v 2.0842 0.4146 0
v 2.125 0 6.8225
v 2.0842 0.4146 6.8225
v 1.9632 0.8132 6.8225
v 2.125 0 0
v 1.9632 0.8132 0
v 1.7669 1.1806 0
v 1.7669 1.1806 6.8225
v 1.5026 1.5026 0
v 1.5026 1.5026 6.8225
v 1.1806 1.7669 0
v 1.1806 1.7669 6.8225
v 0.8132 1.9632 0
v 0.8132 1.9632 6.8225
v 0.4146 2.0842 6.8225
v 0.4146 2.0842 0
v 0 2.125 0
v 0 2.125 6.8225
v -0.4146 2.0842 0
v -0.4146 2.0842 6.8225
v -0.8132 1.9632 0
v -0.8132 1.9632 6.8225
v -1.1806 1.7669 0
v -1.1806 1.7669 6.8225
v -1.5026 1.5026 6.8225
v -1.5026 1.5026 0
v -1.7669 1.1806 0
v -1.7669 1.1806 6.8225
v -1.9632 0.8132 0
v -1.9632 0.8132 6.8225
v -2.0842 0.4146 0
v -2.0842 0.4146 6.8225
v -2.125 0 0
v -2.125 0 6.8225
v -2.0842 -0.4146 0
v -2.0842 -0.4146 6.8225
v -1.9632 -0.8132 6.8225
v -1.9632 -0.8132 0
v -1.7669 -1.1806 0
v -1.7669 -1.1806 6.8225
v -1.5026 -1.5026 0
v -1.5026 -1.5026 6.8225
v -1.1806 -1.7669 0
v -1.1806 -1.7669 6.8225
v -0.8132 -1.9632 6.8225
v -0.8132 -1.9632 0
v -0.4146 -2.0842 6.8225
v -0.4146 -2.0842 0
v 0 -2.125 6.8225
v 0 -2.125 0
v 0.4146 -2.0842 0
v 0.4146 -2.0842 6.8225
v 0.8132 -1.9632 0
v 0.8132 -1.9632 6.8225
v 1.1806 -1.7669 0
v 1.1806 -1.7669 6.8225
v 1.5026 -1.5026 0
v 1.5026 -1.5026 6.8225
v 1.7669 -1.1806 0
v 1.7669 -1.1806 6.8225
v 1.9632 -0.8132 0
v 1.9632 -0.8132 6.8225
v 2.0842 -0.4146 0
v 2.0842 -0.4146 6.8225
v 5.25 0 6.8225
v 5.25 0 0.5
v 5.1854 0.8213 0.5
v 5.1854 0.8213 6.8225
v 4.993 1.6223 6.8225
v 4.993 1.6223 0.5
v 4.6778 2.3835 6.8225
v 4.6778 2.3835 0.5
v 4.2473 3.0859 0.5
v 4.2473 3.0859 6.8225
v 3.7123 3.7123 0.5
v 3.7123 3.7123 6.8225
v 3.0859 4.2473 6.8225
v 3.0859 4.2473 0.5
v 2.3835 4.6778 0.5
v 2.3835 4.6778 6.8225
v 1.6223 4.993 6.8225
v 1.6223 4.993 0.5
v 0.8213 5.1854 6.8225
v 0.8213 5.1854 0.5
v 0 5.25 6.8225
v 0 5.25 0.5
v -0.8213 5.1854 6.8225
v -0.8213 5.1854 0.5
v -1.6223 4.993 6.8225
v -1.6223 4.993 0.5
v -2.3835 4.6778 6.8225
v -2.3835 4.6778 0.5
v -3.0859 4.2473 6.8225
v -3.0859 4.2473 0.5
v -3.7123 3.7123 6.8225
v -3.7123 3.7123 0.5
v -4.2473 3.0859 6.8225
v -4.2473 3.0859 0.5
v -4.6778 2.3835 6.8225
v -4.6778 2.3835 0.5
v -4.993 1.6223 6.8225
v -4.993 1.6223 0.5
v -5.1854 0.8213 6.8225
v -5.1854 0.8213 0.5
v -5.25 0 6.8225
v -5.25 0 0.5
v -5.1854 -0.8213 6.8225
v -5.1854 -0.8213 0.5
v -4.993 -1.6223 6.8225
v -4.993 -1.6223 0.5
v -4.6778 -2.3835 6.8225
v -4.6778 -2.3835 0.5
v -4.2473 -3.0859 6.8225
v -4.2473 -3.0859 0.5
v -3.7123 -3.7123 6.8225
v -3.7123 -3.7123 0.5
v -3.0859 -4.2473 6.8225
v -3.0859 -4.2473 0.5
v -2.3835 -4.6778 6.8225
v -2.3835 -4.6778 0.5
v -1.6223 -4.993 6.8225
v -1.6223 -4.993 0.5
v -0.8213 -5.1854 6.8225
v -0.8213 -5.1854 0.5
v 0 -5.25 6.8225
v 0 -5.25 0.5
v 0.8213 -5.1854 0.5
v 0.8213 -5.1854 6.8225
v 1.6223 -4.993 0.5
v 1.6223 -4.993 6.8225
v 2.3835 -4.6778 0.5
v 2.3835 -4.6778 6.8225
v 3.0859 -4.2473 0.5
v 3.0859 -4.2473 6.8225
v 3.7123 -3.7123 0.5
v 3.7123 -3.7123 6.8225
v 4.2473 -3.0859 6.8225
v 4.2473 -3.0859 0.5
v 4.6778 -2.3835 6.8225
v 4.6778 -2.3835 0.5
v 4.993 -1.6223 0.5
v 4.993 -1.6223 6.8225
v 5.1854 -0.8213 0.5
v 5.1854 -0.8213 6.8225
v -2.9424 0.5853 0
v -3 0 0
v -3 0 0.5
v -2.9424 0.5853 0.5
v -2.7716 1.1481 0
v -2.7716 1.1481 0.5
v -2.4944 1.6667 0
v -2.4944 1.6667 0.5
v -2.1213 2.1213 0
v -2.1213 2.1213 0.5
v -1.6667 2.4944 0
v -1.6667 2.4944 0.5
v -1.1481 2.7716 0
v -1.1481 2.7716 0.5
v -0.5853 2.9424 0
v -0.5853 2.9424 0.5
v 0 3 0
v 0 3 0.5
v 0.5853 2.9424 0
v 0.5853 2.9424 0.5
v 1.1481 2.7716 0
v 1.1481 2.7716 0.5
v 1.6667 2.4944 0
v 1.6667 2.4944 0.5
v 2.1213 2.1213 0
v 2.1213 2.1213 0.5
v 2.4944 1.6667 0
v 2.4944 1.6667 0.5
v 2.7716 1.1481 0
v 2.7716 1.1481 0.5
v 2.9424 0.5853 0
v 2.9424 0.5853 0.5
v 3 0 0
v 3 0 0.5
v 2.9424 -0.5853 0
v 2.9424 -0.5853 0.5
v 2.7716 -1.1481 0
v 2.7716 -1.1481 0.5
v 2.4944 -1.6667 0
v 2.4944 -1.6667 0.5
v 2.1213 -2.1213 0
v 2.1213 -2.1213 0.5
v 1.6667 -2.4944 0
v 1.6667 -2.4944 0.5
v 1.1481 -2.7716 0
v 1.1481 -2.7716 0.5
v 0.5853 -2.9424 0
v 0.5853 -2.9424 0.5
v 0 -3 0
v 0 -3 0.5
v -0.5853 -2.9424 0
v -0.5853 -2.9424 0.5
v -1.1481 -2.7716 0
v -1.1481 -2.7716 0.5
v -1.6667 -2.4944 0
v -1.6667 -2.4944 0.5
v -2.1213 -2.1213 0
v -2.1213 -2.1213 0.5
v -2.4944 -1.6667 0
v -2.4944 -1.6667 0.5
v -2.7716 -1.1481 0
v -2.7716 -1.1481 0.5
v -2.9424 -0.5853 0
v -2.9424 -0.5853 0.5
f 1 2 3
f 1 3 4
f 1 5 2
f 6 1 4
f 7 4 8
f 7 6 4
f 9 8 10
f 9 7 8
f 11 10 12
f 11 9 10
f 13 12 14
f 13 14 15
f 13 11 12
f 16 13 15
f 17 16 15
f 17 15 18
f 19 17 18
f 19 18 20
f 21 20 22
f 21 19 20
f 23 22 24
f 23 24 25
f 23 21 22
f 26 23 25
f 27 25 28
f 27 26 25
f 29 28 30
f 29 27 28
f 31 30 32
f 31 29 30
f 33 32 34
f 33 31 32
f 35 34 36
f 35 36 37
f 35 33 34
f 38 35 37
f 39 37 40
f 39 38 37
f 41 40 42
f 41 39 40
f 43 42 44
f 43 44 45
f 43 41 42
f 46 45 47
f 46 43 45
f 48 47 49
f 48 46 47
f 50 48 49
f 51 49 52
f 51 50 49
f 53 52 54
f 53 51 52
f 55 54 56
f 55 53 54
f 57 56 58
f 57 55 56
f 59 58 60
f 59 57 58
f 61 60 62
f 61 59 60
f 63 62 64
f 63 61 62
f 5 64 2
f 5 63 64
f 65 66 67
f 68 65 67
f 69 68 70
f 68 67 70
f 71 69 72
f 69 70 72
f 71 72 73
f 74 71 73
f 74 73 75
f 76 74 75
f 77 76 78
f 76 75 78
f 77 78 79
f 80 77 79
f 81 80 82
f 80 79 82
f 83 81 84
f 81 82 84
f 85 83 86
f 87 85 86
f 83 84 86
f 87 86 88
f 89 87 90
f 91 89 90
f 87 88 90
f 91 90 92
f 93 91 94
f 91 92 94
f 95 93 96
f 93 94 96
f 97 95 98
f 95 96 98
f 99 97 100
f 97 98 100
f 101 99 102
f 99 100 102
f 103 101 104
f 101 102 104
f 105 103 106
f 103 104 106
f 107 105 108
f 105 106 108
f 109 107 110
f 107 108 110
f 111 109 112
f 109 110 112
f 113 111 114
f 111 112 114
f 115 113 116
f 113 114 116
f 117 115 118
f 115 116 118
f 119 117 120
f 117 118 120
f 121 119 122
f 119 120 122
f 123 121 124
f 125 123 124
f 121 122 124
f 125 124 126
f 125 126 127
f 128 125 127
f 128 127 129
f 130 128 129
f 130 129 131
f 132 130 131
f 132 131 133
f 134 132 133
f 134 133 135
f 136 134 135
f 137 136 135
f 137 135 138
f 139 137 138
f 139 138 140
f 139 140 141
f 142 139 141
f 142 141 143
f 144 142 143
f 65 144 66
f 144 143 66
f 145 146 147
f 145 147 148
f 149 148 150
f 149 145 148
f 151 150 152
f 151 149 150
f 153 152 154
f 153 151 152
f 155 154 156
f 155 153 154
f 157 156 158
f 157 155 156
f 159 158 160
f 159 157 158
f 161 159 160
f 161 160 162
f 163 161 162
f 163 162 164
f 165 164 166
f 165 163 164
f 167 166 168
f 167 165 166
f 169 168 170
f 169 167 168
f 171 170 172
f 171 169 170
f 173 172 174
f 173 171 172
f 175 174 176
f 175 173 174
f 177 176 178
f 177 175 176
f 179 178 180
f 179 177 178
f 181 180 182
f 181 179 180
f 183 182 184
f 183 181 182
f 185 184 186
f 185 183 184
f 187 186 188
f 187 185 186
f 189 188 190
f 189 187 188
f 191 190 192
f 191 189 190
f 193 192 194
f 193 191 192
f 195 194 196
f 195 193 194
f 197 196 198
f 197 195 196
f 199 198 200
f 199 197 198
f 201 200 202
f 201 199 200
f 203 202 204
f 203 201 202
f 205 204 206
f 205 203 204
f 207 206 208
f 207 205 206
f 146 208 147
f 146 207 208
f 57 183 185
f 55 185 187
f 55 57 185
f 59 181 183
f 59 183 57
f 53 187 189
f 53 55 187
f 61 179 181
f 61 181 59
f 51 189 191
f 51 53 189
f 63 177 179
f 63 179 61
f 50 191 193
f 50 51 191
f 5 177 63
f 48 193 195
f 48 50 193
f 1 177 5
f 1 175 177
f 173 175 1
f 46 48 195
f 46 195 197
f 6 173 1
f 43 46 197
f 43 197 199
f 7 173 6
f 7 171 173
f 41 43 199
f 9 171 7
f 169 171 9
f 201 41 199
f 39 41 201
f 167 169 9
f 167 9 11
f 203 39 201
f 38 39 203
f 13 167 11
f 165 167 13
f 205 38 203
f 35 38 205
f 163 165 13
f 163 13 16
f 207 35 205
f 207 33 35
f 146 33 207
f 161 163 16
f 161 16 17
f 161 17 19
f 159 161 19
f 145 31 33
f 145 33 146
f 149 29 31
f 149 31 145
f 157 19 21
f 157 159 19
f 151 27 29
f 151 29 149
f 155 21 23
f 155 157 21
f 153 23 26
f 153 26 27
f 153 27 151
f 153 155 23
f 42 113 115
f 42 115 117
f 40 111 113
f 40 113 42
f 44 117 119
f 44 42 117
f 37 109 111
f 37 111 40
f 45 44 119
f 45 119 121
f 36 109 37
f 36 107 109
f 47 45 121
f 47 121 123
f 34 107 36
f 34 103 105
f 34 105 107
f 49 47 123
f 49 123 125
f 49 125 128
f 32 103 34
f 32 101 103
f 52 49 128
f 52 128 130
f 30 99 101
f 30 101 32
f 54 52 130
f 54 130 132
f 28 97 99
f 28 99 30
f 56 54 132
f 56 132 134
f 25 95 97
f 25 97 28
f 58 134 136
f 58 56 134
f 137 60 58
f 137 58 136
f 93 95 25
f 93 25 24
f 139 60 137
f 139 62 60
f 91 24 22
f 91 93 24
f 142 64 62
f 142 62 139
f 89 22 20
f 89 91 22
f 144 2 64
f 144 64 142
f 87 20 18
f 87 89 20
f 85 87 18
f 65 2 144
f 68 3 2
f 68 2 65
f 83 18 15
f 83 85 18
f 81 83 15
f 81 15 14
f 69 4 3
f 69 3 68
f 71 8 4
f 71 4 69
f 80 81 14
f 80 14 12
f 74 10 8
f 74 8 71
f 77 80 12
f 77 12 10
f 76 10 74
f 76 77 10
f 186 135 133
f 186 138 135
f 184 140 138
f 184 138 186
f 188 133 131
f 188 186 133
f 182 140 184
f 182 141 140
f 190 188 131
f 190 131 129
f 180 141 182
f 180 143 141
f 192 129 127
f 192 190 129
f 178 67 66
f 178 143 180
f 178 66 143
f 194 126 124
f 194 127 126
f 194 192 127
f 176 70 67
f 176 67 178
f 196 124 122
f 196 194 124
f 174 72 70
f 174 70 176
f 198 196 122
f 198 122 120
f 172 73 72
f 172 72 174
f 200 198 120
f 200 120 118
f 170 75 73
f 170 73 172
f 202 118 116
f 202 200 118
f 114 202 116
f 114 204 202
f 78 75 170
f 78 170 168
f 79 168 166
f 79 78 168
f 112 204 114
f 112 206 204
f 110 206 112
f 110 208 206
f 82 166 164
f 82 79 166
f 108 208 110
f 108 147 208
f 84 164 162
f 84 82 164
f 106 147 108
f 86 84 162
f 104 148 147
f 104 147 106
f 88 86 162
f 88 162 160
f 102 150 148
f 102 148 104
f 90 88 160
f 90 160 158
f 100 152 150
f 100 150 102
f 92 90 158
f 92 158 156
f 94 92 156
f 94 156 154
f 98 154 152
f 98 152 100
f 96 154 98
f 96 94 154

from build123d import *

# Parameters (mm, degrees)
SKETCH1_W           = 3.125
SKETCH1_H           = 3.75
SKETCH2_R           = 5.25
SKETCH2_R_2         = 2.125
BOSS_EXTRUDE1_DEPTH = 3.0725
SKETCH3_R           = 5.25
SKETCH3_R_2         = 3
CUT_EXTRUDE1_DEPTH  = 0.5


with BuildPart() as part:
    # Sketch1 → Revolve1 (revolve)
    with BuildSketch(Plane(origin=(0, 0, 0), x_dir=(1, 0, 0), z_dir=(0, 1, 0))):
        with Locations((3.6875, -1.875)):
            Rectangle(SKETCH1_W, SKETCH1_H)
    revolve(axis=Axis((0, 0, 0), (0, 0, 1)))

    # Sketch2 → Boss-Extrude1 (add)
    with BuildSketch(Plane.XY.offset(3.75)):
        Circle(SKETCH2_R)
        Circle(SKETCH2_R_2, mode=Mode.SUBTRACT)
    extrude(amount=BOSS_EXTRUDE1_DEPTH)

    # Sketch3 → Cut-Extrude1 (cut)
    with BuildSketch(Plane(origin=(0, 0, 0), x_dir=(-1, 0, 0), z_dir=(0, 0, -1))):
        Circle(SKETCH3_R)
        Circle(SKETCH3_R_2, mode=Mode.SUBTRACT)
    extrude(amount=-CUT_EXTRUDE1_DEPTH, mode=Mode.SUBTRACT)


solid = part.part
